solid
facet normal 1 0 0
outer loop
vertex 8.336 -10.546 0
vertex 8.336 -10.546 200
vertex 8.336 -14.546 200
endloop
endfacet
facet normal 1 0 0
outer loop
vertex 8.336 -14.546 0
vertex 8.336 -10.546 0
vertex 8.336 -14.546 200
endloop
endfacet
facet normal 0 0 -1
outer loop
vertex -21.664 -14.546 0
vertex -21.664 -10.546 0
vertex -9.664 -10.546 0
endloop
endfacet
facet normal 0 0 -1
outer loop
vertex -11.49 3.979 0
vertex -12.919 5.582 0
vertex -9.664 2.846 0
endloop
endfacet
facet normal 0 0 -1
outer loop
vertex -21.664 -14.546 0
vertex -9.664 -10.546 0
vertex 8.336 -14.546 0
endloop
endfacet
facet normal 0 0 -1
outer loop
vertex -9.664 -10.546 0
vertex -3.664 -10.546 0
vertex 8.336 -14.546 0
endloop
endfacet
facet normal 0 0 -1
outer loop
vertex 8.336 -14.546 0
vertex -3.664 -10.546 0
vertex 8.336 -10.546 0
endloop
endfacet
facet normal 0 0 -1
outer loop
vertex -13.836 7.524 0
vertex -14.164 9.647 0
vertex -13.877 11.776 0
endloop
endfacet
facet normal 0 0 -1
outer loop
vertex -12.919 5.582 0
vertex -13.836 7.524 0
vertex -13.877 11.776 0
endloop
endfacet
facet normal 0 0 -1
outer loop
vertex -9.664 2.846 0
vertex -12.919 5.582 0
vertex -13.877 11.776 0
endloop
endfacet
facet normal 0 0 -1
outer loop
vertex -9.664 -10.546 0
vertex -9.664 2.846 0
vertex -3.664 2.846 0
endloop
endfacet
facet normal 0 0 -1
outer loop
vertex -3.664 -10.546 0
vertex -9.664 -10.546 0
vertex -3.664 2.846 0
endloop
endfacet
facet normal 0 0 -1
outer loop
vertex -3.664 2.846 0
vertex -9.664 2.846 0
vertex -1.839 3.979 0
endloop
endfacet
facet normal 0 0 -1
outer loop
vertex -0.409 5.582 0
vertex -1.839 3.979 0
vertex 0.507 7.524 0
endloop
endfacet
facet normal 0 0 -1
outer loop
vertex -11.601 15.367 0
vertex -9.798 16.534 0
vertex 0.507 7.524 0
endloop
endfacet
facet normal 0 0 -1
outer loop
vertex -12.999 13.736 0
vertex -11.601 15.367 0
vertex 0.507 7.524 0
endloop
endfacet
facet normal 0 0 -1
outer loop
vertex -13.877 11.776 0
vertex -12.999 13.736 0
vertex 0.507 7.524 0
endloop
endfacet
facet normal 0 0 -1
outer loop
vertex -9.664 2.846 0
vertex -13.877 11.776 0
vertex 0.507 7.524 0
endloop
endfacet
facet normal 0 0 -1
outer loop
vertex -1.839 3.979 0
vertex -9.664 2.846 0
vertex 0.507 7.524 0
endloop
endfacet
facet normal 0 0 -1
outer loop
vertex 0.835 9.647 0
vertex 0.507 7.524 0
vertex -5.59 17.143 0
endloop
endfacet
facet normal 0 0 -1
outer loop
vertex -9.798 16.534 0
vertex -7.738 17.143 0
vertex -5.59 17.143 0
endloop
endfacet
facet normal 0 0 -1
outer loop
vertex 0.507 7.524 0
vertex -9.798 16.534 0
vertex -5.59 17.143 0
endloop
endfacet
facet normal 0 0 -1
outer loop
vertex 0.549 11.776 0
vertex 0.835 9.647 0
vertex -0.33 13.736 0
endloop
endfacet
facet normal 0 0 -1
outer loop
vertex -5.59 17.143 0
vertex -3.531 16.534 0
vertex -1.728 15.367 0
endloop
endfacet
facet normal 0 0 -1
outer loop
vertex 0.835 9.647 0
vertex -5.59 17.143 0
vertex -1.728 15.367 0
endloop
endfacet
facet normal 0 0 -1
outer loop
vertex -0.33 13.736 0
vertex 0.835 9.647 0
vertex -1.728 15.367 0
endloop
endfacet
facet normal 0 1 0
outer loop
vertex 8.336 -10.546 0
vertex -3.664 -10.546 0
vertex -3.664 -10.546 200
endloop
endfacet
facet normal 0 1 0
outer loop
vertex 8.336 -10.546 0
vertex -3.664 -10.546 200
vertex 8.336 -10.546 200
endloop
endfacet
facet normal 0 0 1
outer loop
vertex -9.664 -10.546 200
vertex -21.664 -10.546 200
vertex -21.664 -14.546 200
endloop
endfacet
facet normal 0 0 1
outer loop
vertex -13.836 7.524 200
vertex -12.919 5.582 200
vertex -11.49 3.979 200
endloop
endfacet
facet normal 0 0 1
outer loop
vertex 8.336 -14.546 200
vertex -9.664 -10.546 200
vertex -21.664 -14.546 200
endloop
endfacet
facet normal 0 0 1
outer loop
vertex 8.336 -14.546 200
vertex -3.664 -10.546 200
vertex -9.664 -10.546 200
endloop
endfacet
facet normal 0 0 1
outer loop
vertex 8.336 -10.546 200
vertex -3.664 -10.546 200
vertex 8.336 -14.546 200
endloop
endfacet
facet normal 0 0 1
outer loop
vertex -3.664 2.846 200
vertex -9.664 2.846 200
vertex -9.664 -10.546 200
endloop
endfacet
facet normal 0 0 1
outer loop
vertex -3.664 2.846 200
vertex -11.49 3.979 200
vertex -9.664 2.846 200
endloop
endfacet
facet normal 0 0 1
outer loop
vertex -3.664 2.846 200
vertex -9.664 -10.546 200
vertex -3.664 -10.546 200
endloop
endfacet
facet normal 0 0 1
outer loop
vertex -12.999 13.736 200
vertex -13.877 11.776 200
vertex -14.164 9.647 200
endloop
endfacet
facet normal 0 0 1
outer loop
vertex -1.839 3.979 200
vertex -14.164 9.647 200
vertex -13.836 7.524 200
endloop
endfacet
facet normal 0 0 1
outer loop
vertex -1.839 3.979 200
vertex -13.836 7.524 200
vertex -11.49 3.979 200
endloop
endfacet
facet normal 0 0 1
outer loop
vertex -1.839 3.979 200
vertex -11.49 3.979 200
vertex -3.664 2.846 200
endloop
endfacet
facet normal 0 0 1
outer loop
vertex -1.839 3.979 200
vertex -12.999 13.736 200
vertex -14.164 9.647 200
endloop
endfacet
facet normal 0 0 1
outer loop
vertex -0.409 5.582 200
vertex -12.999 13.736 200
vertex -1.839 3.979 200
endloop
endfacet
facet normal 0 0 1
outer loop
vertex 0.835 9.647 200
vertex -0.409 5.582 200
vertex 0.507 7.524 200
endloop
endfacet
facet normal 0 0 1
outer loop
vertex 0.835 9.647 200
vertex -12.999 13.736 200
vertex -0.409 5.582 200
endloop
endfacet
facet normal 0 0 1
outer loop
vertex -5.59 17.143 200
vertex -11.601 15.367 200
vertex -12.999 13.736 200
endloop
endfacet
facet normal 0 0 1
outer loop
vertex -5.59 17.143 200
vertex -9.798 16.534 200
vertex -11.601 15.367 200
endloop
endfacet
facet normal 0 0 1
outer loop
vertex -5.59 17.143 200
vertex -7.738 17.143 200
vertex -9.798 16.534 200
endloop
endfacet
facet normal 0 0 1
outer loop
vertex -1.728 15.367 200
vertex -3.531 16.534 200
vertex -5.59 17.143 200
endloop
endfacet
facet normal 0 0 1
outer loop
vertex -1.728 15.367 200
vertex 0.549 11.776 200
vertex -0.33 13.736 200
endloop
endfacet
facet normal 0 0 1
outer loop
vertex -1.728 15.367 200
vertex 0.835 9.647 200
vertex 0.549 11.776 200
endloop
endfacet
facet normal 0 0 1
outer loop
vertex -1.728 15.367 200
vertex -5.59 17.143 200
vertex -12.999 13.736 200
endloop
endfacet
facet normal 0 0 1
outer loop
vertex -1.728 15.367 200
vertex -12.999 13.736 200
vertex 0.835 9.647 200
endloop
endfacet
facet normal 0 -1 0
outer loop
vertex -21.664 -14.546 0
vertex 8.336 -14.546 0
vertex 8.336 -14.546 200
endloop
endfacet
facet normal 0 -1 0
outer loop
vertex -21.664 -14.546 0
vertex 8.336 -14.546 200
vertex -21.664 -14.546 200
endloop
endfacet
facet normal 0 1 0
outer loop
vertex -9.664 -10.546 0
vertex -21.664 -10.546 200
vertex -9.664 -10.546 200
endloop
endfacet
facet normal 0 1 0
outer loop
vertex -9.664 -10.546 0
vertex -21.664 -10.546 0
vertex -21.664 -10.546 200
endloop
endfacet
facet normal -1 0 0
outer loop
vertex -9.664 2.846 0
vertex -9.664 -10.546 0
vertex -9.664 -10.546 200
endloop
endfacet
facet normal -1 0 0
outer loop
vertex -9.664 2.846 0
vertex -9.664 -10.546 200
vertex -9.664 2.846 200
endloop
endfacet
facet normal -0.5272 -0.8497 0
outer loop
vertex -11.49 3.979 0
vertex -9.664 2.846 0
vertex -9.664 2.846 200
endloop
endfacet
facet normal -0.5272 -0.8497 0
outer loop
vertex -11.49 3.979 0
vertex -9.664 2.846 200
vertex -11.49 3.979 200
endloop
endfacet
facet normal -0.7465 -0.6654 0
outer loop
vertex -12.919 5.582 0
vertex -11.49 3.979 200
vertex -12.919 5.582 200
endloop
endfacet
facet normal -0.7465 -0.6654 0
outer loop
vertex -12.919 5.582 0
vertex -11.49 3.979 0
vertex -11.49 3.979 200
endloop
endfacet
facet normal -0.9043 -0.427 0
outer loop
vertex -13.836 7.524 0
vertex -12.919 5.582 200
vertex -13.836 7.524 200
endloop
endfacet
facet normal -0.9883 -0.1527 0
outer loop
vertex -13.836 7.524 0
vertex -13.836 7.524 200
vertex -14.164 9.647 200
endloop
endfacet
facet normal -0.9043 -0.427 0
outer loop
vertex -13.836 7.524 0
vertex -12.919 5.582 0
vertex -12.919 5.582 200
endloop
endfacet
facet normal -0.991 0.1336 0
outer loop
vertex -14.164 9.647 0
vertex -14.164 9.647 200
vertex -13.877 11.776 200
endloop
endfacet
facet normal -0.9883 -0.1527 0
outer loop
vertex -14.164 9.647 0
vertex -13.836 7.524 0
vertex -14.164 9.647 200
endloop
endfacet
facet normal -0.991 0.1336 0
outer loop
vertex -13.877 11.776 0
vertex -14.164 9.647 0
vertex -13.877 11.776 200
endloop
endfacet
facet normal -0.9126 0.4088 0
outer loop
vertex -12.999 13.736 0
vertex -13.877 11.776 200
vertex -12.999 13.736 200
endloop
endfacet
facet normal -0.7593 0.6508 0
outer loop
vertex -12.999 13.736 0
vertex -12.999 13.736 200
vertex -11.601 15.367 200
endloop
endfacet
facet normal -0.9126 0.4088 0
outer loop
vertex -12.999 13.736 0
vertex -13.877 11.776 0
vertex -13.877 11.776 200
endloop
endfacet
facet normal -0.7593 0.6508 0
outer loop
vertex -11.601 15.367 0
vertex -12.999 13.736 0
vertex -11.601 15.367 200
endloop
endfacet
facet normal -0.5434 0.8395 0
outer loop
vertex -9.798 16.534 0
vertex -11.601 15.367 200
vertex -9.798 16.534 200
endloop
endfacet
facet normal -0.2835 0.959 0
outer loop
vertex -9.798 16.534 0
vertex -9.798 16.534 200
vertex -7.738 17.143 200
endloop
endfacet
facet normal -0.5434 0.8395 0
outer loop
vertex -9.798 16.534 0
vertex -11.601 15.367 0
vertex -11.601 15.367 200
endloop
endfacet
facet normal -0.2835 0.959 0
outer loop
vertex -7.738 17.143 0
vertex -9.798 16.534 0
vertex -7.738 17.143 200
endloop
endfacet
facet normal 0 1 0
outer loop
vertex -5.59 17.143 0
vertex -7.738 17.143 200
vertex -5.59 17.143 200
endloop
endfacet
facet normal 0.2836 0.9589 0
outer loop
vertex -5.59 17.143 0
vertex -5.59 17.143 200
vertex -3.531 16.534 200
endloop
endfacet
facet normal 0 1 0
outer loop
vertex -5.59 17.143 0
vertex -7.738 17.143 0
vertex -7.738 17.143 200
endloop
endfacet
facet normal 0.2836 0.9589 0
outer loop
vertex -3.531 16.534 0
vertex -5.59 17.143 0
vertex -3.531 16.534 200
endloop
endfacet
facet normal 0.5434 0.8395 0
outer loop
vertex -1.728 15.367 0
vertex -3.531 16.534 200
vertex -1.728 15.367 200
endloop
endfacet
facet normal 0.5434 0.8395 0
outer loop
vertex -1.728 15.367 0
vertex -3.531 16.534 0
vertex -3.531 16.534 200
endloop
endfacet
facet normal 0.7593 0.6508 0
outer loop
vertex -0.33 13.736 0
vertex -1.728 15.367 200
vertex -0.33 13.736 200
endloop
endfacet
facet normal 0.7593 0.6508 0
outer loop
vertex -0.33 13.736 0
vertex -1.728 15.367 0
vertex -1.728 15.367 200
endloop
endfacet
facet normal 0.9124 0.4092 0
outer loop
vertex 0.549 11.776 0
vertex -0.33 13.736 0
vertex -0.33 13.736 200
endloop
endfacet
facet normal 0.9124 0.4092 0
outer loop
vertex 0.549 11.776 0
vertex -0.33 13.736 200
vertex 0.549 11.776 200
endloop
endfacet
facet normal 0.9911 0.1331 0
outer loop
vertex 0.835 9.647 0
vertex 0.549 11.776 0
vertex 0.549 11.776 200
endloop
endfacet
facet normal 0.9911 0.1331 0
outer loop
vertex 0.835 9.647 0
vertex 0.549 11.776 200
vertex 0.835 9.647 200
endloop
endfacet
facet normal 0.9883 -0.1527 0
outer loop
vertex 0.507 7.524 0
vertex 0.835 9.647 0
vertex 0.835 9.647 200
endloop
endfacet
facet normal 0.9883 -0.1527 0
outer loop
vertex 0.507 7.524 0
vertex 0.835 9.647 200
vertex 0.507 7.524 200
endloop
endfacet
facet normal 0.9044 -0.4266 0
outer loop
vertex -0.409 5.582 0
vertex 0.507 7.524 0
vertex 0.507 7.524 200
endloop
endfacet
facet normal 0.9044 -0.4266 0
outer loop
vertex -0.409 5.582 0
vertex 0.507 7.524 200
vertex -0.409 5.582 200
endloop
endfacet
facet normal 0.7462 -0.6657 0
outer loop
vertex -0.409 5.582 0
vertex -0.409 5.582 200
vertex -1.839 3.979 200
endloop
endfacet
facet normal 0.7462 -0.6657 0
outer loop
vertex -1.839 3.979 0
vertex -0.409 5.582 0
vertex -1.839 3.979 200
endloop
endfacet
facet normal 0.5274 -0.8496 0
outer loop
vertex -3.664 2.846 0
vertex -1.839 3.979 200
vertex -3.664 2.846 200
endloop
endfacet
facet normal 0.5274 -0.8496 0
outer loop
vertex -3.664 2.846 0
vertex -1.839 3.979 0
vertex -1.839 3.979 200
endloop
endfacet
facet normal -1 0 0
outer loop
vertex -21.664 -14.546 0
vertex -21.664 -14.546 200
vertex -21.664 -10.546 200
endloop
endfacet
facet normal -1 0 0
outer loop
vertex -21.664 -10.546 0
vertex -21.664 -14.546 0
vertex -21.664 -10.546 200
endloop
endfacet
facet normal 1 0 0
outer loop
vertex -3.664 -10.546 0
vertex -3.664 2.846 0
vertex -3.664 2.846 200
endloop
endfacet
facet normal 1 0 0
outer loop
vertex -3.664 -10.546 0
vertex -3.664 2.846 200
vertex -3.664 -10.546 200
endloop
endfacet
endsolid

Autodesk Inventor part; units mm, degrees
ref_plane "YZ Plane" through (0, 0, 0) normal (1, 0, 0) x (0, 1, 0)
ref_plane "XZ Plane" through (0, 0, 0) normal (0, 1, 0) x (-1, 0, 0)
ref_plane "XY Plane" through (0, 0, 0) normal (0, 0, 1) x (1, 0, 0)
sketch "Sketch1" plane through (0, 0, 0) normal (0, 0, 1) x (1, 0, 0)
  circle A0 centre (-6.6643, 9.7203) radius 7.5
  line L0 (-9.6643, 9.7203) -> (-3.6643, 9.7203)
  line L1 (-3.6643, 9.7203) -> (-3.6643, -10.5455)
  line L2 (-3.6643, -10.5455) -> (-9.6643, -10.5455)
  line L3 (-9.6643, -10.5455) -> (-9.6643, 9.7203)
  line L4 (-21.6643, -10.5455) -> (8.3357, -10.5455)
  line L5 (8.3357, -10.5455) -> (8.3357, -14.5455)
  line L6 (8.3357, -14.5455) -> (-21.6643, -14.5455)
  line L7 (-21.6643, -14.5455) -> (-21.6643, -10.5455)
  point P0 (0, 0)
  point P1 (0, 0)
  dimension "d0" = 15
  dimension "d1" = 6
  dimension "d2" = 4
  dimension "d3" = 30
  dimension "d4" = 12
  dimension "d5" = 3
  dimension "d6" = 3
  dimension "d7" = 12
  dimension "d8" = 0
extrude "Extrusion1" add sketch "Sketch1" along normal blind 200
equation "\"d4\" = d7"
properties part number "z rail"
